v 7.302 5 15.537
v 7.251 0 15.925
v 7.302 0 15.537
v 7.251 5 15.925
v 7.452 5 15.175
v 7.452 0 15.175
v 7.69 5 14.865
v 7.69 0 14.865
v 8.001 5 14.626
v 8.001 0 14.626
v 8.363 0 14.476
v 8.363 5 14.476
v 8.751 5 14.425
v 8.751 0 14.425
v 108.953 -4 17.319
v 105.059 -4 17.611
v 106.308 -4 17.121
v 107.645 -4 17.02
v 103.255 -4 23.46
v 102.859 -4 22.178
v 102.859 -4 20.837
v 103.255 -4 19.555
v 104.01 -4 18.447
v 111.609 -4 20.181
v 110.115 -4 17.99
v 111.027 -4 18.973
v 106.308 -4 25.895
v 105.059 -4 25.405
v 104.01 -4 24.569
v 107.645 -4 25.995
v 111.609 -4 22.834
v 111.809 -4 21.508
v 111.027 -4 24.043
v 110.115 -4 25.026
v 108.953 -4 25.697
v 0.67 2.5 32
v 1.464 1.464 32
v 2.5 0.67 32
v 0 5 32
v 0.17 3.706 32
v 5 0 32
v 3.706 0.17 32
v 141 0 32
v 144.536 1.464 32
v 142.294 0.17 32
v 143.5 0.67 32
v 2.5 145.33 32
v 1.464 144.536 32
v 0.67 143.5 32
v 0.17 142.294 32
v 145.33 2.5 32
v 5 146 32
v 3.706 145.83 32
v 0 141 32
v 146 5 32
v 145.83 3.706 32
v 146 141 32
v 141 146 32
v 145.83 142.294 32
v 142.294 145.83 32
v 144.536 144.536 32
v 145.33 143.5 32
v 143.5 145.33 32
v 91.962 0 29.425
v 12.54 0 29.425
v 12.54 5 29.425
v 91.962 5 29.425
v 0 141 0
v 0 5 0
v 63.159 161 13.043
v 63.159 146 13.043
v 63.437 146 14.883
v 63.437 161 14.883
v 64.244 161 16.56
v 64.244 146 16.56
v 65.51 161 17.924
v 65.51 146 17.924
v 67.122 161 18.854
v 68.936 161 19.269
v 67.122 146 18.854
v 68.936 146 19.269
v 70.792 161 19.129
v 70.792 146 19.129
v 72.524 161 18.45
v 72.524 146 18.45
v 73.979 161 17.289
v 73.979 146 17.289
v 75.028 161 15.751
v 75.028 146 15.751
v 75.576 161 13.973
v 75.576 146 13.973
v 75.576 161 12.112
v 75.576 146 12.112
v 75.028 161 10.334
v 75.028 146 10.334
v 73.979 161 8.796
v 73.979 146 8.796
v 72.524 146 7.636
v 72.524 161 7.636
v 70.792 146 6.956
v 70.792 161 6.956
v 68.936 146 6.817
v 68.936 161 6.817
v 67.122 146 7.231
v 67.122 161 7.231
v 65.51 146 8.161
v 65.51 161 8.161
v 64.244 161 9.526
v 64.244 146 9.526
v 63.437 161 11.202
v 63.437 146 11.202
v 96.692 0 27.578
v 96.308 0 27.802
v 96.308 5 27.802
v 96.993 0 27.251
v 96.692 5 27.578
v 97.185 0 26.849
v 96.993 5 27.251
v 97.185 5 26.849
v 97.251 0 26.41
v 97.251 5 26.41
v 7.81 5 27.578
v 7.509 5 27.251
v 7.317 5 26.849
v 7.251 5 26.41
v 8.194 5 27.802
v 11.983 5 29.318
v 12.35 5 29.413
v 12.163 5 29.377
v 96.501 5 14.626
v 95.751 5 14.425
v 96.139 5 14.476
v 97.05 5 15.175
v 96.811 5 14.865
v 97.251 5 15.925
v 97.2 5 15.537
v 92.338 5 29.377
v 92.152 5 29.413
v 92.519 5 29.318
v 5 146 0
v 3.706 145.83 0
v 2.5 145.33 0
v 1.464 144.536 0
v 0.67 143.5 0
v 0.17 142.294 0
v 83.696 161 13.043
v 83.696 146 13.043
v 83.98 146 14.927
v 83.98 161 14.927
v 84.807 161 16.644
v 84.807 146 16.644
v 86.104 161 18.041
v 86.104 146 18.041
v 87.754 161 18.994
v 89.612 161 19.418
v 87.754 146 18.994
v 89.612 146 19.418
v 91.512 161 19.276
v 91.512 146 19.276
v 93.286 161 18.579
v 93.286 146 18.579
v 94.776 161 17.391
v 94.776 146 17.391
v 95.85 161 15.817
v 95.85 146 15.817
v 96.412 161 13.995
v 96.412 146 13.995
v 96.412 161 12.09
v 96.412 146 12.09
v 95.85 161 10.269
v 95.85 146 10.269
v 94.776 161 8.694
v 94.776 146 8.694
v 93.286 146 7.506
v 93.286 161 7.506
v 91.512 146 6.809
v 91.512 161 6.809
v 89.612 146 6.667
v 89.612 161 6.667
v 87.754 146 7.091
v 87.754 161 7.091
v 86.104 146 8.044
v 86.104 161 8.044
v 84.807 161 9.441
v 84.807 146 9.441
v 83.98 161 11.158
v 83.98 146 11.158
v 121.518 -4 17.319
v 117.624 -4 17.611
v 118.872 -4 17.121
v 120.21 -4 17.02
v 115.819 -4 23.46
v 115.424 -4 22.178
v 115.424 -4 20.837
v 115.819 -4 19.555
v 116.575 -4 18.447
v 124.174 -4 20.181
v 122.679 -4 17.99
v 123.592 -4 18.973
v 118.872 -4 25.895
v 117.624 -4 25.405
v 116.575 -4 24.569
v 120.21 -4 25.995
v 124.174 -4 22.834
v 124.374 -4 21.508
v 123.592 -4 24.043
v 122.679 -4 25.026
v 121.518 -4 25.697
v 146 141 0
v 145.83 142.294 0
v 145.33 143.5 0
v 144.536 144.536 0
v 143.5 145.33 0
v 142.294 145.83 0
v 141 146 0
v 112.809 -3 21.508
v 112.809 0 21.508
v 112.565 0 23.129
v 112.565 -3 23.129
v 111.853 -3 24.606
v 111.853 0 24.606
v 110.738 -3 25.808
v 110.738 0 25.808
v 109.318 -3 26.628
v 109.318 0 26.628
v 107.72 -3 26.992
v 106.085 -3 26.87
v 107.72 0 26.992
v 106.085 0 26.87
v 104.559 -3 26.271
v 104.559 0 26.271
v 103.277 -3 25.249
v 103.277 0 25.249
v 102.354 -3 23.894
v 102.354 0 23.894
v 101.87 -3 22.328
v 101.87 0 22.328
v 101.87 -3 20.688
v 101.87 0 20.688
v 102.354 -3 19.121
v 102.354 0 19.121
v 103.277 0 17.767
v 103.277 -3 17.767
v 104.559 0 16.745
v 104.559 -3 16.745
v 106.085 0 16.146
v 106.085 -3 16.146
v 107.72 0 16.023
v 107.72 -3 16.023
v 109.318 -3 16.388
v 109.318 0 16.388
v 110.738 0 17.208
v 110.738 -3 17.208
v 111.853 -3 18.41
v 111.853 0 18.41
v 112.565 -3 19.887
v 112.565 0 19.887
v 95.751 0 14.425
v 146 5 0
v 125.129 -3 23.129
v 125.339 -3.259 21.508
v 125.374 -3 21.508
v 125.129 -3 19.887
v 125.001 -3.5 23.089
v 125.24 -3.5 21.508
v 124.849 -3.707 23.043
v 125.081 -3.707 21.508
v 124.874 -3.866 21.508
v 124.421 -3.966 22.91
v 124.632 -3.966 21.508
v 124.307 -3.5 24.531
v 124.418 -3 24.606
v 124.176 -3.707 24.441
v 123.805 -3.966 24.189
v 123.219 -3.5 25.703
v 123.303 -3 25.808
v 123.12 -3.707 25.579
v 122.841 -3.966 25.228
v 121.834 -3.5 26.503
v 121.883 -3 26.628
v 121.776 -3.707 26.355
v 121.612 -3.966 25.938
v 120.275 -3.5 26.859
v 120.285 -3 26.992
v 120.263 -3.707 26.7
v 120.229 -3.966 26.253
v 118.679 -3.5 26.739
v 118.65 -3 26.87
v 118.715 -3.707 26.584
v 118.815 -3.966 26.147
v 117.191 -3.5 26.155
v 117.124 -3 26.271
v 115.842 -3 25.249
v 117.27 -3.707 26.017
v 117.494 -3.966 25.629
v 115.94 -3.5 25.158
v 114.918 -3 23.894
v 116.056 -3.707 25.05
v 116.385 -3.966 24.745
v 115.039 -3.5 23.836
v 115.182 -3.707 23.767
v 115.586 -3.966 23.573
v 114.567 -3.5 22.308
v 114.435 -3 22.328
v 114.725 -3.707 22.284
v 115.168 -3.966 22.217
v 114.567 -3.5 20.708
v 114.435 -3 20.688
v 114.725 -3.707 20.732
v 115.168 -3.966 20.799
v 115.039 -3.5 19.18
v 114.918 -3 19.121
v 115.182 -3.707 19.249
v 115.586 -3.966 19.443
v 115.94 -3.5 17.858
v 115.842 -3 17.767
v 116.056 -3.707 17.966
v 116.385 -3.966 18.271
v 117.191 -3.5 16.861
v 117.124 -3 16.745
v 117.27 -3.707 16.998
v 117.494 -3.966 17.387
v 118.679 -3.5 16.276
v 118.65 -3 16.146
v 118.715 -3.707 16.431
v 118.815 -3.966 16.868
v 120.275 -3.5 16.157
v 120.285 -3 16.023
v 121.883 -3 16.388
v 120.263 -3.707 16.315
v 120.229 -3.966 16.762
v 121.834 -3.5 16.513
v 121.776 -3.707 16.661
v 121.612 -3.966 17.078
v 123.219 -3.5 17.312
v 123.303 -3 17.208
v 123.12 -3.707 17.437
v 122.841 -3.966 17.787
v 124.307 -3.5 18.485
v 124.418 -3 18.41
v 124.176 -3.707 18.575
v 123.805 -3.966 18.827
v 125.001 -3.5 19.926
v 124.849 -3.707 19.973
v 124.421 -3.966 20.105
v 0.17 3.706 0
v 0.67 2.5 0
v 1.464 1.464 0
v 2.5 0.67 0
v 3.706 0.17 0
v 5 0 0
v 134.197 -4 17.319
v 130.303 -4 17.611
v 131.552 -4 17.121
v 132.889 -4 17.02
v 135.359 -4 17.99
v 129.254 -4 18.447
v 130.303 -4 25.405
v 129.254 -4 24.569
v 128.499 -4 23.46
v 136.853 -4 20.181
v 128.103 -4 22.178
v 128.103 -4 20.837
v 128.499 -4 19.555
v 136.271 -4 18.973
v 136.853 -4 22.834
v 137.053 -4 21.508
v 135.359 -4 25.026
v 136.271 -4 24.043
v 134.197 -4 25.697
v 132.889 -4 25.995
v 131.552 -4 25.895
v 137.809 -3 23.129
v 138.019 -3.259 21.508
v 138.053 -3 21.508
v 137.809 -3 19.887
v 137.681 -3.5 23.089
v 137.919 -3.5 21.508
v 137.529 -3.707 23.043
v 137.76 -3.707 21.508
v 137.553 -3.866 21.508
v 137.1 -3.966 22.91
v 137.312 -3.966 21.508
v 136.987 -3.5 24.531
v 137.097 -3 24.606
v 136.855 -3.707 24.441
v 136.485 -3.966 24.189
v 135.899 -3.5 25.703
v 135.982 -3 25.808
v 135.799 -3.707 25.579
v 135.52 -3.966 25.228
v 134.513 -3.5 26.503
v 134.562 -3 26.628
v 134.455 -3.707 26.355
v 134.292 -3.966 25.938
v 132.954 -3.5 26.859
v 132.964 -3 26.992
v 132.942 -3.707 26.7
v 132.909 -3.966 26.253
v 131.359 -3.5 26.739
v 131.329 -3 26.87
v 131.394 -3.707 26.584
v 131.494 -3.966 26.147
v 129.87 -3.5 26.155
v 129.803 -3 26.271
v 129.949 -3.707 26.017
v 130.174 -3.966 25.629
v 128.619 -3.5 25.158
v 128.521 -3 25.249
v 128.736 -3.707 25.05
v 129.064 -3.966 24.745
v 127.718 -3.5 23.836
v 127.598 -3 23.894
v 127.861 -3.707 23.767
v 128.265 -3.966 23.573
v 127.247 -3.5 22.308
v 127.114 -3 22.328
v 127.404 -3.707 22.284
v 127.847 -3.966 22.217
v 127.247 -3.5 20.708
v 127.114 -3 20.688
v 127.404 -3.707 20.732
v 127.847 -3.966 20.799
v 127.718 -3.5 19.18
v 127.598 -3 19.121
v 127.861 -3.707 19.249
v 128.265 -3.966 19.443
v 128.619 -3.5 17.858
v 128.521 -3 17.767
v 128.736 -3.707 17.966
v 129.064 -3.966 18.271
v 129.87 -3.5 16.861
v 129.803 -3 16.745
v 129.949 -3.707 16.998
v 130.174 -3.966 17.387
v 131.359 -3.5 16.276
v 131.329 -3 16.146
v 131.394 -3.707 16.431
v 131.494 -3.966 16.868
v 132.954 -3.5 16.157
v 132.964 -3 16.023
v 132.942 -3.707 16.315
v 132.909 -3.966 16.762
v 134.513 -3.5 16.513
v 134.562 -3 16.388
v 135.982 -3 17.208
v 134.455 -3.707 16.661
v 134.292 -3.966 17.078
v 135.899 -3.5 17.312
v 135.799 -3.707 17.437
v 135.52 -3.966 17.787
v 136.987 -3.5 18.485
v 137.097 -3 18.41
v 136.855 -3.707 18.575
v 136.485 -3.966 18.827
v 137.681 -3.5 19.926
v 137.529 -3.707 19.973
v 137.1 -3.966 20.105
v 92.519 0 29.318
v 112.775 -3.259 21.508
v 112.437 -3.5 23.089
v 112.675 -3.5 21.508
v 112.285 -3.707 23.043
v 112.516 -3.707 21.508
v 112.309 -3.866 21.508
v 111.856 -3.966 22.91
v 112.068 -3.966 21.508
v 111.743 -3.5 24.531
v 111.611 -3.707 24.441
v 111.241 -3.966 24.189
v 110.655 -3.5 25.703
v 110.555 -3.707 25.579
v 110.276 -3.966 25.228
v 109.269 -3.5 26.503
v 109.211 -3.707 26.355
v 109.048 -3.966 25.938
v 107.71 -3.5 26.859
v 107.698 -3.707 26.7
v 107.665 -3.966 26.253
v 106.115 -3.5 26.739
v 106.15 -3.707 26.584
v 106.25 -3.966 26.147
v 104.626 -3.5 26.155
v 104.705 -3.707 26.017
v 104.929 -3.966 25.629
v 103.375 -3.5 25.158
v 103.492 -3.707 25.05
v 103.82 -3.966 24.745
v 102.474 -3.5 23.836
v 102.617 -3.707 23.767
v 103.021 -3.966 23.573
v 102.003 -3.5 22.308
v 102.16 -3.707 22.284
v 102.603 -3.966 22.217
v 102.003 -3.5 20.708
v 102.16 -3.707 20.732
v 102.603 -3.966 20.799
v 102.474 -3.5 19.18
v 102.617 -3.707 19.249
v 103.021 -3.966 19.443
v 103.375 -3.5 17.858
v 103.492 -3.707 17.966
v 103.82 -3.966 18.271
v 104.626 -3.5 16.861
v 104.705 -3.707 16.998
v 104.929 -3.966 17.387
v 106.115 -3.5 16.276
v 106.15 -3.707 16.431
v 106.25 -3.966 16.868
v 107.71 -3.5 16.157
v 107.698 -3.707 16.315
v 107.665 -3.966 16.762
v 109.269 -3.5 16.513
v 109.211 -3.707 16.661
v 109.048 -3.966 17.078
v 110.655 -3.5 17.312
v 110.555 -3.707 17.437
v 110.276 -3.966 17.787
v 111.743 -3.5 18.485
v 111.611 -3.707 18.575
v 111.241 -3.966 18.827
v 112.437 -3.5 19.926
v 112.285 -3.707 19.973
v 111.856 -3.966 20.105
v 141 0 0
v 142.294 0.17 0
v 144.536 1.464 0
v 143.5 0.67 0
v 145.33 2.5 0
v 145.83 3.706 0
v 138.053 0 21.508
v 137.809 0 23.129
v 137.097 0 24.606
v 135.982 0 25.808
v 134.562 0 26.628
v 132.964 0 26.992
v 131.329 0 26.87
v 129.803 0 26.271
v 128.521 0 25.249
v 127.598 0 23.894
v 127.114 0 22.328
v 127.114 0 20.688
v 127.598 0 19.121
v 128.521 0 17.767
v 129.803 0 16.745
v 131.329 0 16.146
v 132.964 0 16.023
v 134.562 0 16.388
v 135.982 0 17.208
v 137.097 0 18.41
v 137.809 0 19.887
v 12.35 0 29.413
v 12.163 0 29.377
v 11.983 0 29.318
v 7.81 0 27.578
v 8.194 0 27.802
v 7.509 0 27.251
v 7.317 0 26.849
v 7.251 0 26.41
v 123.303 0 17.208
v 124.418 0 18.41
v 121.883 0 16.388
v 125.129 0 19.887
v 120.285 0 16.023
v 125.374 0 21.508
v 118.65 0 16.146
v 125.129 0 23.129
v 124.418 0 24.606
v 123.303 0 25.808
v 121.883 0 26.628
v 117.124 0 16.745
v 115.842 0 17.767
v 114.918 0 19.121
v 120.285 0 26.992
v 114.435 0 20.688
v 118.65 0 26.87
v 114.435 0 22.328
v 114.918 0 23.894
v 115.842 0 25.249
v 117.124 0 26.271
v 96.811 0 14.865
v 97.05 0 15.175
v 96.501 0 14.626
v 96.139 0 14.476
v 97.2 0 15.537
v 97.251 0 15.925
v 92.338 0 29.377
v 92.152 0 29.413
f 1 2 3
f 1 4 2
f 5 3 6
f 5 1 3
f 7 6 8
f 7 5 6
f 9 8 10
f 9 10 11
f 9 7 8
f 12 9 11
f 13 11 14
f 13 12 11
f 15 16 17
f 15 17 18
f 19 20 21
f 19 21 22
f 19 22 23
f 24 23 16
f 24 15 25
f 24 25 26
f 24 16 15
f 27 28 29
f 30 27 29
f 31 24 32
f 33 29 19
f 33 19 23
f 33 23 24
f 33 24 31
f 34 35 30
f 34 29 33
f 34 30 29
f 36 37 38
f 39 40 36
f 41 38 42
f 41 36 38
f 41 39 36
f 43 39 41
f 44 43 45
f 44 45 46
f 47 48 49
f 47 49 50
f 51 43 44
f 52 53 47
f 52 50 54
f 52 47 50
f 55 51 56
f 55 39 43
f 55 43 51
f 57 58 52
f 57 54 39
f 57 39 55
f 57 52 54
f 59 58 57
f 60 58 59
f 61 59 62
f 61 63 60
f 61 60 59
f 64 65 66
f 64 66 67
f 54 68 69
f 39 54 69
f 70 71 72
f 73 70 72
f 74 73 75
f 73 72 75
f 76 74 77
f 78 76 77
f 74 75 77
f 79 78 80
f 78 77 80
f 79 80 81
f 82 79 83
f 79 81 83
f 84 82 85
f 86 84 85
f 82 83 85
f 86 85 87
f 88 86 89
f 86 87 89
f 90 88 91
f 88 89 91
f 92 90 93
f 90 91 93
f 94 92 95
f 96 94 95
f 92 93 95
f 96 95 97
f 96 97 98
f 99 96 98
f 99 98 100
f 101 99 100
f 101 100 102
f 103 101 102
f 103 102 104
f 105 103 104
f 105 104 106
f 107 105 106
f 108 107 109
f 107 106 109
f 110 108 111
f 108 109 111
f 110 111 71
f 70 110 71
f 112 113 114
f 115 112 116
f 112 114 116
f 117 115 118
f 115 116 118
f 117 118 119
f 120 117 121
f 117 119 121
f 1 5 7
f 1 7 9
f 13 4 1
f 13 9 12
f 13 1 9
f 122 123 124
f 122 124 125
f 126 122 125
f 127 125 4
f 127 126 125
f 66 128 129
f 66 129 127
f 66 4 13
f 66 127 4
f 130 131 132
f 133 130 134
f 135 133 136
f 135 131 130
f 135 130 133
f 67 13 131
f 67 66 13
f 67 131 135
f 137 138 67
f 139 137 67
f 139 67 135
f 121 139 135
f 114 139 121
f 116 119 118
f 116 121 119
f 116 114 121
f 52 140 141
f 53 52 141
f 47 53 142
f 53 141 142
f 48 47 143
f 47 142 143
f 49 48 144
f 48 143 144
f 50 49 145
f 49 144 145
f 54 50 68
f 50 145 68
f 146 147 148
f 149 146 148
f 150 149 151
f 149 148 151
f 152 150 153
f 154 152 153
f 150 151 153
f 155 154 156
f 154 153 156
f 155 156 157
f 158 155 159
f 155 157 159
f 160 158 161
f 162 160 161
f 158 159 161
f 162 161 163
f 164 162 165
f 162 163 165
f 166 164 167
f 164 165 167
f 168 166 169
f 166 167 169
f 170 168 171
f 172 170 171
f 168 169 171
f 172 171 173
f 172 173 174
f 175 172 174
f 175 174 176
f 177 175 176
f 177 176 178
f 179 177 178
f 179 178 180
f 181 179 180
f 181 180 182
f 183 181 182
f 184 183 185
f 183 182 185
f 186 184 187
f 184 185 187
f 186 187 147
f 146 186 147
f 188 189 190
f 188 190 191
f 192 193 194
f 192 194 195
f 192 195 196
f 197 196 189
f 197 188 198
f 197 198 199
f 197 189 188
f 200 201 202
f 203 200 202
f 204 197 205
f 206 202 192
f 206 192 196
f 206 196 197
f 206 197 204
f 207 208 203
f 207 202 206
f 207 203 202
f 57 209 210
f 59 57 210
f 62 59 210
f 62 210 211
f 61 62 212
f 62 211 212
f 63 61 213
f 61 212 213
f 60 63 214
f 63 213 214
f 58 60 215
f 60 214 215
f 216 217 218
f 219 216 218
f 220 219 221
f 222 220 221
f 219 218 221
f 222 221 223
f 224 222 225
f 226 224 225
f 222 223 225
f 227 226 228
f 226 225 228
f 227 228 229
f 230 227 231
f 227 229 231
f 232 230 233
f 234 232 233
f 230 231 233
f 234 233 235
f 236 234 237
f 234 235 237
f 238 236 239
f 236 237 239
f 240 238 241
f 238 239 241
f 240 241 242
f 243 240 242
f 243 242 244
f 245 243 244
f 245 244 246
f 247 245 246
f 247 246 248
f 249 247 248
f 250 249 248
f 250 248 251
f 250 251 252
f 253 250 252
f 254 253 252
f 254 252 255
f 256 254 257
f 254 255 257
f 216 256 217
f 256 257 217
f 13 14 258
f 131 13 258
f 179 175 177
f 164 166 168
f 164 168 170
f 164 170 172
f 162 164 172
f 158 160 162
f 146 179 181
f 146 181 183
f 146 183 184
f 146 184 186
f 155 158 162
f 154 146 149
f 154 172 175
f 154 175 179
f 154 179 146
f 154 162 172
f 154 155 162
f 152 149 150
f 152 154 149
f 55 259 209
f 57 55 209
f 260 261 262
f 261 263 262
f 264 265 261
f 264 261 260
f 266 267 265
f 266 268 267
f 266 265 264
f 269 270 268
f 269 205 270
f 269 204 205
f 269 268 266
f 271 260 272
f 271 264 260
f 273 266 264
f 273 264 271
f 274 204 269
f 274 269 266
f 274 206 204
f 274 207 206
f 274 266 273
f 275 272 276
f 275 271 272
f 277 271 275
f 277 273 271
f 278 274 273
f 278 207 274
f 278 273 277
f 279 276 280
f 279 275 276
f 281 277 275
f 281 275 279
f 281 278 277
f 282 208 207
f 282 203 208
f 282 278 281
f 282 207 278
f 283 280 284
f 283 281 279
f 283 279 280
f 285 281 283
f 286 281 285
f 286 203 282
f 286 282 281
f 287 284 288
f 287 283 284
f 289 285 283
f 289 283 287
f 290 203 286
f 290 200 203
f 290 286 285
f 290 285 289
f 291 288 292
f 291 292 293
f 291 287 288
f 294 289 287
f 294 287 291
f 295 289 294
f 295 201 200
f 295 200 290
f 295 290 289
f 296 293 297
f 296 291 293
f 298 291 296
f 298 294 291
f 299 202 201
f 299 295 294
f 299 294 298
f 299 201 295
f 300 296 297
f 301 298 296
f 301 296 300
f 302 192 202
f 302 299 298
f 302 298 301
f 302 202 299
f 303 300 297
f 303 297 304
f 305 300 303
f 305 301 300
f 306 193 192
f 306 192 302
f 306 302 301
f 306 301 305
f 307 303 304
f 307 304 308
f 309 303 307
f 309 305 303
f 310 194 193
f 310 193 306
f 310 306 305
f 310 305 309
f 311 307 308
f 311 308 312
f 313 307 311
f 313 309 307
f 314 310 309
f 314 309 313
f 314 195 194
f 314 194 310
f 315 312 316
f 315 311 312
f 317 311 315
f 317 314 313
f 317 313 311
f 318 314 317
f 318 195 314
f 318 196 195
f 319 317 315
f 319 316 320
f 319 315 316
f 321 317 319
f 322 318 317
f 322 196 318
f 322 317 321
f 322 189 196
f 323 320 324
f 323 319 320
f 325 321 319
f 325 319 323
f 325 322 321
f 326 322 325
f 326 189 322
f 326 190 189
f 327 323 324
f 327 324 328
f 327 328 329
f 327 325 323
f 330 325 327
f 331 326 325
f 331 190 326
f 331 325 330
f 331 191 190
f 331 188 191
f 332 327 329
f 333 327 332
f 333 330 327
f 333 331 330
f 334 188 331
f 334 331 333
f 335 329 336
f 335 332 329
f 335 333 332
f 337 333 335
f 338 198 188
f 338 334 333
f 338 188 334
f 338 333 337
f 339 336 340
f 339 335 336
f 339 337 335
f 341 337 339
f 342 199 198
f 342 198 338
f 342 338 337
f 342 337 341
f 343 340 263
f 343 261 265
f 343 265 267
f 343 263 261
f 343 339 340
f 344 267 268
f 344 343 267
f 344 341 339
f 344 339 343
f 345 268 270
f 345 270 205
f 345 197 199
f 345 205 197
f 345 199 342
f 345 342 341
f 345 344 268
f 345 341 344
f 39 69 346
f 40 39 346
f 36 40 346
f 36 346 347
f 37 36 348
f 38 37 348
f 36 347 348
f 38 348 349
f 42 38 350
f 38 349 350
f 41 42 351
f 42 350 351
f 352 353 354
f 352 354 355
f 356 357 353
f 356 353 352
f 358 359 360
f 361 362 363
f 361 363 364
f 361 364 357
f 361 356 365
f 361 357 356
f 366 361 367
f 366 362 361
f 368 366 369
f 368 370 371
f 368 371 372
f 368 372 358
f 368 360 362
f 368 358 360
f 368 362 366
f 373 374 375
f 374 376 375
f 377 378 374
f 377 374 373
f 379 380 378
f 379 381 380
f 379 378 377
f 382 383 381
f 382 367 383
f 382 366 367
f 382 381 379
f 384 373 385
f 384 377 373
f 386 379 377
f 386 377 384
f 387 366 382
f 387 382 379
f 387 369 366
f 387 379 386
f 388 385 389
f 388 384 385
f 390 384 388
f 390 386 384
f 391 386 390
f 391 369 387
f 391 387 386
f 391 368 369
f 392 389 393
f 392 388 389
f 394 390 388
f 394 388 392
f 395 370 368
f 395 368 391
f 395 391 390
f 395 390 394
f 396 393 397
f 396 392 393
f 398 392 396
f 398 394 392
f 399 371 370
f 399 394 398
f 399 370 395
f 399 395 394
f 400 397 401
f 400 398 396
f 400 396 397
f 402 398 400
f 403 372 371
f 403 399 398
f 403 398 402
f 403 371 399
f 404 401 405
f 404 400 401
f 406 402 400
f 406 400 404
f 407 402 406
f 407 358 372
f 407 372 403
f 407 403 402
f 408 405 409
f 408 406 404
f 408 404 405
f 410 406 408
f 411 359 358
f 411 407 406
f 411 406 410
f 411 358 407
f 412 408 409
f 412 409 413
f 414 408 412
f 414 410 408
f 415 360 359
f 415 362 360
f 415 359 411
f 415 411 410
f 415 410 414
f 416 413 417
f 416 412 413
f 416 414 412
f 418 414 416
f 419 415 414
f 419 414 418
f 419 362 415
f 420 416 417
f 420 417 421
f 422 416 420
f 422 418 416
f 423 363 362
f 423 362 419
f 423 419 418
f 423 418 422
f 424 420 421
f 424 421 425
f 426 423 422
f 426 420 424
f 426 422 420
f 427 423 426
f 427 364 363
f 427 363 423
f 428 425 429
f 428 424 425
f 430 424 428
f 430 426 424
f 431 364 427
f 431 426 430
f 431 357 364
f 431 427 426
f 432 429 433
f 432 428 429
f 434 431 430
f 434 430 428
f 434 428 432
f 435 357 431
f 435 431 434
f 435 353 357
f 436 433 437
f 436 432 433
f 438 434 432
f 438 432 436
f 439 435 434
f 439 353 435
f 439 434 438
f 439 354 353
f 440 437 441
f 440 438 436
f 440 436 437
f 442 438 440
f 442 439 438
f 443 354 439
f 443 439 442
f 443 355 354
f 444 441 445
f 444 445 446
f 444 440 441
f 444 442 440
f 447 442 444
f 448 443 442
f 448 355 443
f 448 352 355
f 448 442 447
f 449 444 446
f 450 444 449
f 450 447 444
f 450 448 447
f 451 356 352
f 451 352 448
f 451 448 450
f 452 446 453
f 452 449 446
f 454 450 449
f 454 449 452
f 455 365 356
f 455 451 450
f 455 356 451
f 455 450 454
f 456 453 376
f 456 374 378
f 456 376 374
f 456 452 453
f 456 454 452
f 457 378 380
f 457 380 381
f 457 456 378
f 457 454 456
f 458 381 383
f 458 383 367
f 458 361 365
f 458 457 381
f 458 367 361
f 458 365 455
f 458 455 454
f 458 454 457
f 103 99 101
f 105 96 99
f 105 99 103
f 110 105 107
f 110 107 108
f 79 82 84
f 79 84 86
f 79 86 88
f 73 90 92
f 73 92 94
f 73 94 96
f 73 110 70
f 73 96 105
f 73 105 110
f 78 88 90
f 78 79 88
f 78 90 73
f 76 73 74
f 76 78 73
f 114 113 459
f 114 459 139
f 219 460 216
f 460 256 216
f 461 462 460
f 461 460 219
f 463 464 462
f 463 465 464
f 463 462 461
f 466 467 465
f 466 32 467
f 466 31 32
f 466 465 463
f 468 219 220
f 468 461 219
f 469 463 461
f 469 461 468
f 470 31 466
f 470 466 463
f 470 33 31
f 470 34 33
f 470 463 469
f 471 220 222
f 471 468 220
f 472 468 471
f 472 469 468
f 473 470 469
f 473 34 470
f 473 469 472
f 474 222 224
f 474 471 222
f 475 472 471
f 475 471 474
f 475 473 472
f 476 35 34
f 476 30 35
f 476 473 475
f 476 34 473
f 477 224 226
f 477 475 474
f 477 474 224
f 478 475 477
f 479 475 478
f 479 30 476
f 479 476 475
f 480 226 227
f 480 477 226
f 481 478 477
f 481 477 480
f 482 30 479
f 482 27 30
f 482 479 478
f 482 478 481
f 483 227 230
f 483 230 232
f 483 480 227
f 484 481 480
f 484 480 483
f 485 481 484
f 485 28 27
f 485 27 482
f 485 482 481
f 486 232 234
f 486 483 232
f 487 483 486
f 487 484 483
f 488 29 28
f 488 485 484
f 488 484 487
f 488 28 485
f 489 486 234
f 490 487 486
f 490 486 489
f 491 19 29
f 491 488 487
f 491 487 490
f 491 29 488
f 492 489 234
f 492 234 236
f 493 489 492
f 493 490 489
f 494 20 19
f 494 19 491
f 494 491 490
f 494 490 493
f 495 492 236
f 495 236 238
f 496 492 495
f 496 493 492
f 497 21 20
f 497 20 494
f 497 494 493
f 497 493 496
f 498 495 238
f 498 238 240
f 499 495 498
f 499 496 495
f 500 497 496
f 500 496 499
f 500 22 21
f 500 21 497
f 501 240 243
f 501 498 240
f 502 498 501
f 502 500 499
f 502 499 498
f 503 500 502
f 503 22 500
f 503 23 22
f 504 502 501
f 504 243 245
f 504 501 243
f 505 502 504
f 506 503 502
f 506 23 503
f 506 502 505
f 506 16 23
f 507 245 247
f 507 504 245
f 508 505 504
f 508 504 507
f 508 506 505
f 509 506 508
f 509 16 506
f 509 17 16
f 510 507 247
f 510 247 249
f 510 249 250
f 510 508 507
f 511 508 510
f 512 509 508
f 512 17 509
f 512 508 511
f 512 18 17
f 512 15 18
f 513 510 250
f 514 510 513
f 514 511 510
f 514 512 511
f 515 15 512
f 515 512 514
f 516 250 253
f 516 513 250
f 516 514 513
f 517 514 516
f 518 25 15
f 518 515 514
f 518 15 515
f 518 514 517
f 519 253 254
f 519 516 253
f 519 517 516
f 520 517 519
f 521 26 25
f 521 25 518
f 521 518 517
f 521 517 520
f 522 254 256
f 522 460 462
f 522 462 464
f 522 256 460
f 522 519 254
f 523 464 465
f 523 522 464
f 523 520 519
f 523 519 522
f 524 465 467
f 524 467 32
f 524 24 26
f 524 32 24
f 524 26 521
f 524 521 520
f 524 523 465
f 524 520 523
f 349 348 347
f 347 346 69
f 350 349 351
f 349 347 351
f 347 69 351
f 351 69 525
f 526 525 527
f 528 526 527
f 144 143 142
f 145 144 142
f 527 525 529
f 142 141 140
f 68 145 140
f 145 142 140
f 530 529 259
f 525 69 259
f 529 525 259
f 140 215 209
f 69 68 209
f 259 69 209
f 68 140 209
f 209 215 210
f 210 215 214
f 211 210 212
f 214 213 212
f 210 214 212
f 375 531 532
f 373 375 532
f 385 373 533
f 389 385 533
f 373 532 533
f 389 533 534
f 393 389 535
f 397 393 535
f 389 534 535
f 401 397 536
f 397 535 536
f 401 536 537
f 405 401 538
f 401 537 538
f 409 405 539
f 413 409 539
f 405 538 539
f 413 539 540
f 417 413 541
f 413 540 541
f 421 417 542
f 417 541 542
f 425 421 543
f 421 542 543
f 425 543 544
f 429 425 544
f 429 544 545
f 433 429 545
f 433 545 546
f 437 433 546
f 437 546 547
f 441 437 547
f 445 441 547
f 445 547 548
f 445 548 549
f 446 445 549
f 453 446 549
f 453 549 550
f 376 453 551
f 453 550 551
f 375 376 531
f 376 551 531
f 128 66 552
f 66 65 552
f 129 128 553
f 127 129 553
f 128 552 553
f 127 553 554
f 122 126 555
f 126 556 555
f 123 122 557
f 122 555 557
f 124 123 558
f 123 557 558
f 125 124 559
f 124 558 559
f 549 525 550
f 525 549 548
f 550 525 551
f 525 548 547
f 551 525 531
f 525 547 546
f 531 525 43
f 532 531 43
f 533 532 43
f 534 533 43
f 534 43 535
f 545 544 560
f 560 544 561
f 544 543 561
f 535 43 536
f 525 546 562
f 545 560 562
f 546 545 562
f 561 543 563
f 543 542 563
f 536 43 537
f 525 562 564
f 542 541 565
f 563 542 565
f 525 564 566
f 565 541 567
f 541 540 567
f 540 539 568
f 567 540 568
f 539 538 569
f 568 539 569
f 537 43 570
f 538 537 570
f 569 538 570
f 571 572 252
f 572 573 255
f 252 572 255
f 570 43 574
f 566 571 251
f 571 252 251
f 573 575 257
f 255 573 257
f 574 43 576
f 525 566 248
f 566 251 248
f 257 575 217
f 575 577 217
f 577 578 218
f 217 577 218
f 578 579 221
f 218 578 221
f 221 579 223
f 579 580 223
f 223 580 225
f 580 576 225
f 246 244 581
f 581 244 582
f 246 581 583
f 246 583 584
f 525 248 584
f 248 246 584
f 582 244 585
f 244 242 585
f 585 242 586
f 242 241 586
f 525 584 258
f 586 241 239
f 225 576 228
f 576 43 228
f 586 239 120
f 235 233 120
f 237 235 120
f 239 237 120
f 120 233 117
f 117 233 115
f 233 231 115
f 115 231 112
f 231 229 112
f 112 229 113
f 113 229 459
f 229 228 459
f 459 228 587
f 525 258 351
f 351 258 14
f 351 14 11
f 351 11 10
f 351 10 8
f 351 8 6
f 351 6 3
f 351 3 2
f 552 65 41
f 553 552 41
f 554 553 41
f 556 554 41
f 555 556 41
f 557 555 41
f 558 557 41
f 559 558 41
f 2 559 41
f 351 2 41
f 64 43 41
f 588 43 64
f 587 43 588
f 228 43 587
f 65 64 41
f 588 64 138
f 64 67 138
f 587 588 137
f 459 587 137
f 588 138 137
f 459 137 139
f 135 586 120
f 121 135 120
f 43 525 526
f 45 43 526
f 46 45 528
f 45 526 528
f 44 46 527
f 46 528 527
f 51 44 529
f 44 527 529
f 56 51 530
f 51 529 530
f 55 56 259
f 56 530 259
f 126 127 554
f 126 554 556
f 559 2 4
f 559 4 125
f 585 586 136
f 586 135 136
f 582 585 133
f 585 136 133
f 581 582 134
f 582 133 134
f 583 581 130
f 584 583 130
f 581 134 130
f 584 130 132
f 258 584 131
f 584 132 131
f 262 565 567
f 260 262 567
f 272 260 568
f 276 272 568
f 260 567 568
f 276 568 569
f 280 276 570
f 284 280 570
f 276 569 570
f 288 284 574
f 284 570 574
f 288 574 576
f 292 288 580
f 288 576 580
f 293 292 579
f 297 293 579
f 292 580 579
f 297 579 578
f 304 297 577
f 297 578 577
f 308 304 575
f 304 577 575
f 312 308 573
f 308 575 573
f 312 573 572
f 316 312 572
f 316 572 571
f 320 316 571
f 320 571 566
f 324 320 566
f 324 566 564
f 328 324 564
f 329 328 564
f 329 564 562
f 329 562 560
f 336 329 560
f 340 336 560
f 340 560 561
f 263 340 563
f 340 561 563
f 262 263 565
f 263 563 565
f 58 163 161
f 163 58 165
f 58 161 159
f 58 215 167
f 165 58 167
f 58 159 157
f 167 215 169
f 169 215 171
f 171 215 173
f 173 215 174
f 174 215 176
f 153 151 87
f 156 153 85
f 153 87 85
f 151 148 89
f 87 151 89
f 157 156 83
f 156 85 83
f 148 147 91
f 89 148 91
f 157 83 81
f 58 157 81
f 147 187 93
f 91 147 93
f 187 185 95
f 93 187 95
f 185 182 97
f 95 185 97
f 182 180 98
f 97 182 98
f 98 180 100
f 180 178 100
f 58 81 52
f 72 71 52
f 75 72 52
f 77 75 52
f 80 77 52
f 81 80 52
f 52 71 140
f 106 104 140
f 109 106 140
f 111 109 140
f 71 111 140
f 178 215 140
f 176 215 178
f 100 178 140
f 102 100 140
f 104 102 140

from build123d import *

# Parameters (mm, degrees)
F1_DEPTH    = 32
F2_R        = 5.5
F3_DEPTH    = 4
F4_R        = 1
F2_W        = 90
F2_H        = 15
F5_DEPTH    = 5
F6_T1_DEPTH = 17.9655681957
F7_SIZE2    = 2
F7_SIZE     = 5
F8_R        = 1.5
F9_R        = 6.3934301863
F9_R_2      = 6.243428201
F10_DEPTH   = 15


# Not quite as in the source:
# - a fillet or chamfer that OpenCascade refuses, or shapes differently, is made with other operations: its cross-section is extruded or revolved along the edge and cut away or added


with BuildPart() as f1:
    # F0 (on Top) → F1 (new body)
    with BuildSketch(Plane.XY):
        with BuildLine():
            ThreePointArc((0, 5), (1.4644660941, 1.4644660941), (5, 0))
            Line((5, 0), (141, 0))
            ThreePointArc((141, 0), (144.5355339059, 1.4644660941), (146, 5))
            Line((146, 5), (146, 141))
            ThreePointArc((146, 141), (144.5355339059, 144.5355339059), (141, 146))
            Line((141, 146), (5, 146))
            ThreePointArc((5, 146), (1.4644660941, 144.5355339059), (0, 141))
            Line((0, 141), (0, 5))
        make_face()
    extrude(amount=F1_DEPTH)

    # F2 (on face) → F3 (join)
    with BuildSketch(Plane.XZ):
        with Locations((107.308909297, 21.5077847242)):
            Circle(F2_R)
        with Locations((119.8735386133, 21.5077847242)):
            Circle(F2_R)
        with Locations((132.552921772, 21.5077847242)):
            Circle(F2_R)
    extrude(amount=F3_DEPTH)

    # F4
    f4_edges = [f1.edges().sort_by_distance(p)[0] for p in [
        (101.808909, -4, 21.507785),
        (114.373539, -4, 21.507785),
        (127.052922, -4, 21.507785),
    ]]
    fillet(f4_edges, radius=F4_R)

    # F2 (on face) → F5 (cut)
    with BuildSketch(Plane.XZ):
        with Locations((52.2508216836, 21.9252242893)):
            Rectangle(F2_W, F2_H)
    extrude(amount=-F5_DEPTH, mode=Mode.SUBTRACT)

    # F6: chamfer of 2 x 5 on 1 edges, made by hand

    # F6_s2 → F6_t1 (join)
    with BuildSketch(Plane.XZ.offset(-17.9655681957)):
        Polygon((12.2508216836, 29.4252242893), (7.2508216836, 27.4252242893), (7.2508216836, 29.4252242893), align=None)
    extrude(amount=F6_T1_DEPTH)

    # F7
    f7_edges = [f1.edges().sort_by_distance(p)[0] for p in [
        (97.250822, 2.5, 29.425224),
    ]]
    chamfer(f7_edges, length=F7_SIZE, length2=F7_SIZE2)

    # F8
    f8_edges = [f1.edges().sort_by_distance(p)[0] for p in [
        (92.250822, 2.5, 29.425224),
        (97.250822, 2.5, 27.425224),
        (97.250822, 2.5, 14.425224),
        (7.250822, 2.5, 14.425224),
        (7.250822, 2.5, 27.425224),
        (12.250822, 2.5, 29.425224),
    ]]
    fillet(f8_edges, radius=F8_R)

    # F9 (on face) → F10 (join)
    with BuildSketch(Plane(origin=(0, 146, 0), x_dir=(-1, 0, 0), z_dir=(0, 1, 0))):
        with Locations((-90.0897681713, 13.0425486714)):
            Circle(F9_R)
        with Locations((-69.4026425481, 13.0425486714)):
            Circle(F9_R_2)
    extrude(amount=F10_DEPTH)


solid = f1.part
